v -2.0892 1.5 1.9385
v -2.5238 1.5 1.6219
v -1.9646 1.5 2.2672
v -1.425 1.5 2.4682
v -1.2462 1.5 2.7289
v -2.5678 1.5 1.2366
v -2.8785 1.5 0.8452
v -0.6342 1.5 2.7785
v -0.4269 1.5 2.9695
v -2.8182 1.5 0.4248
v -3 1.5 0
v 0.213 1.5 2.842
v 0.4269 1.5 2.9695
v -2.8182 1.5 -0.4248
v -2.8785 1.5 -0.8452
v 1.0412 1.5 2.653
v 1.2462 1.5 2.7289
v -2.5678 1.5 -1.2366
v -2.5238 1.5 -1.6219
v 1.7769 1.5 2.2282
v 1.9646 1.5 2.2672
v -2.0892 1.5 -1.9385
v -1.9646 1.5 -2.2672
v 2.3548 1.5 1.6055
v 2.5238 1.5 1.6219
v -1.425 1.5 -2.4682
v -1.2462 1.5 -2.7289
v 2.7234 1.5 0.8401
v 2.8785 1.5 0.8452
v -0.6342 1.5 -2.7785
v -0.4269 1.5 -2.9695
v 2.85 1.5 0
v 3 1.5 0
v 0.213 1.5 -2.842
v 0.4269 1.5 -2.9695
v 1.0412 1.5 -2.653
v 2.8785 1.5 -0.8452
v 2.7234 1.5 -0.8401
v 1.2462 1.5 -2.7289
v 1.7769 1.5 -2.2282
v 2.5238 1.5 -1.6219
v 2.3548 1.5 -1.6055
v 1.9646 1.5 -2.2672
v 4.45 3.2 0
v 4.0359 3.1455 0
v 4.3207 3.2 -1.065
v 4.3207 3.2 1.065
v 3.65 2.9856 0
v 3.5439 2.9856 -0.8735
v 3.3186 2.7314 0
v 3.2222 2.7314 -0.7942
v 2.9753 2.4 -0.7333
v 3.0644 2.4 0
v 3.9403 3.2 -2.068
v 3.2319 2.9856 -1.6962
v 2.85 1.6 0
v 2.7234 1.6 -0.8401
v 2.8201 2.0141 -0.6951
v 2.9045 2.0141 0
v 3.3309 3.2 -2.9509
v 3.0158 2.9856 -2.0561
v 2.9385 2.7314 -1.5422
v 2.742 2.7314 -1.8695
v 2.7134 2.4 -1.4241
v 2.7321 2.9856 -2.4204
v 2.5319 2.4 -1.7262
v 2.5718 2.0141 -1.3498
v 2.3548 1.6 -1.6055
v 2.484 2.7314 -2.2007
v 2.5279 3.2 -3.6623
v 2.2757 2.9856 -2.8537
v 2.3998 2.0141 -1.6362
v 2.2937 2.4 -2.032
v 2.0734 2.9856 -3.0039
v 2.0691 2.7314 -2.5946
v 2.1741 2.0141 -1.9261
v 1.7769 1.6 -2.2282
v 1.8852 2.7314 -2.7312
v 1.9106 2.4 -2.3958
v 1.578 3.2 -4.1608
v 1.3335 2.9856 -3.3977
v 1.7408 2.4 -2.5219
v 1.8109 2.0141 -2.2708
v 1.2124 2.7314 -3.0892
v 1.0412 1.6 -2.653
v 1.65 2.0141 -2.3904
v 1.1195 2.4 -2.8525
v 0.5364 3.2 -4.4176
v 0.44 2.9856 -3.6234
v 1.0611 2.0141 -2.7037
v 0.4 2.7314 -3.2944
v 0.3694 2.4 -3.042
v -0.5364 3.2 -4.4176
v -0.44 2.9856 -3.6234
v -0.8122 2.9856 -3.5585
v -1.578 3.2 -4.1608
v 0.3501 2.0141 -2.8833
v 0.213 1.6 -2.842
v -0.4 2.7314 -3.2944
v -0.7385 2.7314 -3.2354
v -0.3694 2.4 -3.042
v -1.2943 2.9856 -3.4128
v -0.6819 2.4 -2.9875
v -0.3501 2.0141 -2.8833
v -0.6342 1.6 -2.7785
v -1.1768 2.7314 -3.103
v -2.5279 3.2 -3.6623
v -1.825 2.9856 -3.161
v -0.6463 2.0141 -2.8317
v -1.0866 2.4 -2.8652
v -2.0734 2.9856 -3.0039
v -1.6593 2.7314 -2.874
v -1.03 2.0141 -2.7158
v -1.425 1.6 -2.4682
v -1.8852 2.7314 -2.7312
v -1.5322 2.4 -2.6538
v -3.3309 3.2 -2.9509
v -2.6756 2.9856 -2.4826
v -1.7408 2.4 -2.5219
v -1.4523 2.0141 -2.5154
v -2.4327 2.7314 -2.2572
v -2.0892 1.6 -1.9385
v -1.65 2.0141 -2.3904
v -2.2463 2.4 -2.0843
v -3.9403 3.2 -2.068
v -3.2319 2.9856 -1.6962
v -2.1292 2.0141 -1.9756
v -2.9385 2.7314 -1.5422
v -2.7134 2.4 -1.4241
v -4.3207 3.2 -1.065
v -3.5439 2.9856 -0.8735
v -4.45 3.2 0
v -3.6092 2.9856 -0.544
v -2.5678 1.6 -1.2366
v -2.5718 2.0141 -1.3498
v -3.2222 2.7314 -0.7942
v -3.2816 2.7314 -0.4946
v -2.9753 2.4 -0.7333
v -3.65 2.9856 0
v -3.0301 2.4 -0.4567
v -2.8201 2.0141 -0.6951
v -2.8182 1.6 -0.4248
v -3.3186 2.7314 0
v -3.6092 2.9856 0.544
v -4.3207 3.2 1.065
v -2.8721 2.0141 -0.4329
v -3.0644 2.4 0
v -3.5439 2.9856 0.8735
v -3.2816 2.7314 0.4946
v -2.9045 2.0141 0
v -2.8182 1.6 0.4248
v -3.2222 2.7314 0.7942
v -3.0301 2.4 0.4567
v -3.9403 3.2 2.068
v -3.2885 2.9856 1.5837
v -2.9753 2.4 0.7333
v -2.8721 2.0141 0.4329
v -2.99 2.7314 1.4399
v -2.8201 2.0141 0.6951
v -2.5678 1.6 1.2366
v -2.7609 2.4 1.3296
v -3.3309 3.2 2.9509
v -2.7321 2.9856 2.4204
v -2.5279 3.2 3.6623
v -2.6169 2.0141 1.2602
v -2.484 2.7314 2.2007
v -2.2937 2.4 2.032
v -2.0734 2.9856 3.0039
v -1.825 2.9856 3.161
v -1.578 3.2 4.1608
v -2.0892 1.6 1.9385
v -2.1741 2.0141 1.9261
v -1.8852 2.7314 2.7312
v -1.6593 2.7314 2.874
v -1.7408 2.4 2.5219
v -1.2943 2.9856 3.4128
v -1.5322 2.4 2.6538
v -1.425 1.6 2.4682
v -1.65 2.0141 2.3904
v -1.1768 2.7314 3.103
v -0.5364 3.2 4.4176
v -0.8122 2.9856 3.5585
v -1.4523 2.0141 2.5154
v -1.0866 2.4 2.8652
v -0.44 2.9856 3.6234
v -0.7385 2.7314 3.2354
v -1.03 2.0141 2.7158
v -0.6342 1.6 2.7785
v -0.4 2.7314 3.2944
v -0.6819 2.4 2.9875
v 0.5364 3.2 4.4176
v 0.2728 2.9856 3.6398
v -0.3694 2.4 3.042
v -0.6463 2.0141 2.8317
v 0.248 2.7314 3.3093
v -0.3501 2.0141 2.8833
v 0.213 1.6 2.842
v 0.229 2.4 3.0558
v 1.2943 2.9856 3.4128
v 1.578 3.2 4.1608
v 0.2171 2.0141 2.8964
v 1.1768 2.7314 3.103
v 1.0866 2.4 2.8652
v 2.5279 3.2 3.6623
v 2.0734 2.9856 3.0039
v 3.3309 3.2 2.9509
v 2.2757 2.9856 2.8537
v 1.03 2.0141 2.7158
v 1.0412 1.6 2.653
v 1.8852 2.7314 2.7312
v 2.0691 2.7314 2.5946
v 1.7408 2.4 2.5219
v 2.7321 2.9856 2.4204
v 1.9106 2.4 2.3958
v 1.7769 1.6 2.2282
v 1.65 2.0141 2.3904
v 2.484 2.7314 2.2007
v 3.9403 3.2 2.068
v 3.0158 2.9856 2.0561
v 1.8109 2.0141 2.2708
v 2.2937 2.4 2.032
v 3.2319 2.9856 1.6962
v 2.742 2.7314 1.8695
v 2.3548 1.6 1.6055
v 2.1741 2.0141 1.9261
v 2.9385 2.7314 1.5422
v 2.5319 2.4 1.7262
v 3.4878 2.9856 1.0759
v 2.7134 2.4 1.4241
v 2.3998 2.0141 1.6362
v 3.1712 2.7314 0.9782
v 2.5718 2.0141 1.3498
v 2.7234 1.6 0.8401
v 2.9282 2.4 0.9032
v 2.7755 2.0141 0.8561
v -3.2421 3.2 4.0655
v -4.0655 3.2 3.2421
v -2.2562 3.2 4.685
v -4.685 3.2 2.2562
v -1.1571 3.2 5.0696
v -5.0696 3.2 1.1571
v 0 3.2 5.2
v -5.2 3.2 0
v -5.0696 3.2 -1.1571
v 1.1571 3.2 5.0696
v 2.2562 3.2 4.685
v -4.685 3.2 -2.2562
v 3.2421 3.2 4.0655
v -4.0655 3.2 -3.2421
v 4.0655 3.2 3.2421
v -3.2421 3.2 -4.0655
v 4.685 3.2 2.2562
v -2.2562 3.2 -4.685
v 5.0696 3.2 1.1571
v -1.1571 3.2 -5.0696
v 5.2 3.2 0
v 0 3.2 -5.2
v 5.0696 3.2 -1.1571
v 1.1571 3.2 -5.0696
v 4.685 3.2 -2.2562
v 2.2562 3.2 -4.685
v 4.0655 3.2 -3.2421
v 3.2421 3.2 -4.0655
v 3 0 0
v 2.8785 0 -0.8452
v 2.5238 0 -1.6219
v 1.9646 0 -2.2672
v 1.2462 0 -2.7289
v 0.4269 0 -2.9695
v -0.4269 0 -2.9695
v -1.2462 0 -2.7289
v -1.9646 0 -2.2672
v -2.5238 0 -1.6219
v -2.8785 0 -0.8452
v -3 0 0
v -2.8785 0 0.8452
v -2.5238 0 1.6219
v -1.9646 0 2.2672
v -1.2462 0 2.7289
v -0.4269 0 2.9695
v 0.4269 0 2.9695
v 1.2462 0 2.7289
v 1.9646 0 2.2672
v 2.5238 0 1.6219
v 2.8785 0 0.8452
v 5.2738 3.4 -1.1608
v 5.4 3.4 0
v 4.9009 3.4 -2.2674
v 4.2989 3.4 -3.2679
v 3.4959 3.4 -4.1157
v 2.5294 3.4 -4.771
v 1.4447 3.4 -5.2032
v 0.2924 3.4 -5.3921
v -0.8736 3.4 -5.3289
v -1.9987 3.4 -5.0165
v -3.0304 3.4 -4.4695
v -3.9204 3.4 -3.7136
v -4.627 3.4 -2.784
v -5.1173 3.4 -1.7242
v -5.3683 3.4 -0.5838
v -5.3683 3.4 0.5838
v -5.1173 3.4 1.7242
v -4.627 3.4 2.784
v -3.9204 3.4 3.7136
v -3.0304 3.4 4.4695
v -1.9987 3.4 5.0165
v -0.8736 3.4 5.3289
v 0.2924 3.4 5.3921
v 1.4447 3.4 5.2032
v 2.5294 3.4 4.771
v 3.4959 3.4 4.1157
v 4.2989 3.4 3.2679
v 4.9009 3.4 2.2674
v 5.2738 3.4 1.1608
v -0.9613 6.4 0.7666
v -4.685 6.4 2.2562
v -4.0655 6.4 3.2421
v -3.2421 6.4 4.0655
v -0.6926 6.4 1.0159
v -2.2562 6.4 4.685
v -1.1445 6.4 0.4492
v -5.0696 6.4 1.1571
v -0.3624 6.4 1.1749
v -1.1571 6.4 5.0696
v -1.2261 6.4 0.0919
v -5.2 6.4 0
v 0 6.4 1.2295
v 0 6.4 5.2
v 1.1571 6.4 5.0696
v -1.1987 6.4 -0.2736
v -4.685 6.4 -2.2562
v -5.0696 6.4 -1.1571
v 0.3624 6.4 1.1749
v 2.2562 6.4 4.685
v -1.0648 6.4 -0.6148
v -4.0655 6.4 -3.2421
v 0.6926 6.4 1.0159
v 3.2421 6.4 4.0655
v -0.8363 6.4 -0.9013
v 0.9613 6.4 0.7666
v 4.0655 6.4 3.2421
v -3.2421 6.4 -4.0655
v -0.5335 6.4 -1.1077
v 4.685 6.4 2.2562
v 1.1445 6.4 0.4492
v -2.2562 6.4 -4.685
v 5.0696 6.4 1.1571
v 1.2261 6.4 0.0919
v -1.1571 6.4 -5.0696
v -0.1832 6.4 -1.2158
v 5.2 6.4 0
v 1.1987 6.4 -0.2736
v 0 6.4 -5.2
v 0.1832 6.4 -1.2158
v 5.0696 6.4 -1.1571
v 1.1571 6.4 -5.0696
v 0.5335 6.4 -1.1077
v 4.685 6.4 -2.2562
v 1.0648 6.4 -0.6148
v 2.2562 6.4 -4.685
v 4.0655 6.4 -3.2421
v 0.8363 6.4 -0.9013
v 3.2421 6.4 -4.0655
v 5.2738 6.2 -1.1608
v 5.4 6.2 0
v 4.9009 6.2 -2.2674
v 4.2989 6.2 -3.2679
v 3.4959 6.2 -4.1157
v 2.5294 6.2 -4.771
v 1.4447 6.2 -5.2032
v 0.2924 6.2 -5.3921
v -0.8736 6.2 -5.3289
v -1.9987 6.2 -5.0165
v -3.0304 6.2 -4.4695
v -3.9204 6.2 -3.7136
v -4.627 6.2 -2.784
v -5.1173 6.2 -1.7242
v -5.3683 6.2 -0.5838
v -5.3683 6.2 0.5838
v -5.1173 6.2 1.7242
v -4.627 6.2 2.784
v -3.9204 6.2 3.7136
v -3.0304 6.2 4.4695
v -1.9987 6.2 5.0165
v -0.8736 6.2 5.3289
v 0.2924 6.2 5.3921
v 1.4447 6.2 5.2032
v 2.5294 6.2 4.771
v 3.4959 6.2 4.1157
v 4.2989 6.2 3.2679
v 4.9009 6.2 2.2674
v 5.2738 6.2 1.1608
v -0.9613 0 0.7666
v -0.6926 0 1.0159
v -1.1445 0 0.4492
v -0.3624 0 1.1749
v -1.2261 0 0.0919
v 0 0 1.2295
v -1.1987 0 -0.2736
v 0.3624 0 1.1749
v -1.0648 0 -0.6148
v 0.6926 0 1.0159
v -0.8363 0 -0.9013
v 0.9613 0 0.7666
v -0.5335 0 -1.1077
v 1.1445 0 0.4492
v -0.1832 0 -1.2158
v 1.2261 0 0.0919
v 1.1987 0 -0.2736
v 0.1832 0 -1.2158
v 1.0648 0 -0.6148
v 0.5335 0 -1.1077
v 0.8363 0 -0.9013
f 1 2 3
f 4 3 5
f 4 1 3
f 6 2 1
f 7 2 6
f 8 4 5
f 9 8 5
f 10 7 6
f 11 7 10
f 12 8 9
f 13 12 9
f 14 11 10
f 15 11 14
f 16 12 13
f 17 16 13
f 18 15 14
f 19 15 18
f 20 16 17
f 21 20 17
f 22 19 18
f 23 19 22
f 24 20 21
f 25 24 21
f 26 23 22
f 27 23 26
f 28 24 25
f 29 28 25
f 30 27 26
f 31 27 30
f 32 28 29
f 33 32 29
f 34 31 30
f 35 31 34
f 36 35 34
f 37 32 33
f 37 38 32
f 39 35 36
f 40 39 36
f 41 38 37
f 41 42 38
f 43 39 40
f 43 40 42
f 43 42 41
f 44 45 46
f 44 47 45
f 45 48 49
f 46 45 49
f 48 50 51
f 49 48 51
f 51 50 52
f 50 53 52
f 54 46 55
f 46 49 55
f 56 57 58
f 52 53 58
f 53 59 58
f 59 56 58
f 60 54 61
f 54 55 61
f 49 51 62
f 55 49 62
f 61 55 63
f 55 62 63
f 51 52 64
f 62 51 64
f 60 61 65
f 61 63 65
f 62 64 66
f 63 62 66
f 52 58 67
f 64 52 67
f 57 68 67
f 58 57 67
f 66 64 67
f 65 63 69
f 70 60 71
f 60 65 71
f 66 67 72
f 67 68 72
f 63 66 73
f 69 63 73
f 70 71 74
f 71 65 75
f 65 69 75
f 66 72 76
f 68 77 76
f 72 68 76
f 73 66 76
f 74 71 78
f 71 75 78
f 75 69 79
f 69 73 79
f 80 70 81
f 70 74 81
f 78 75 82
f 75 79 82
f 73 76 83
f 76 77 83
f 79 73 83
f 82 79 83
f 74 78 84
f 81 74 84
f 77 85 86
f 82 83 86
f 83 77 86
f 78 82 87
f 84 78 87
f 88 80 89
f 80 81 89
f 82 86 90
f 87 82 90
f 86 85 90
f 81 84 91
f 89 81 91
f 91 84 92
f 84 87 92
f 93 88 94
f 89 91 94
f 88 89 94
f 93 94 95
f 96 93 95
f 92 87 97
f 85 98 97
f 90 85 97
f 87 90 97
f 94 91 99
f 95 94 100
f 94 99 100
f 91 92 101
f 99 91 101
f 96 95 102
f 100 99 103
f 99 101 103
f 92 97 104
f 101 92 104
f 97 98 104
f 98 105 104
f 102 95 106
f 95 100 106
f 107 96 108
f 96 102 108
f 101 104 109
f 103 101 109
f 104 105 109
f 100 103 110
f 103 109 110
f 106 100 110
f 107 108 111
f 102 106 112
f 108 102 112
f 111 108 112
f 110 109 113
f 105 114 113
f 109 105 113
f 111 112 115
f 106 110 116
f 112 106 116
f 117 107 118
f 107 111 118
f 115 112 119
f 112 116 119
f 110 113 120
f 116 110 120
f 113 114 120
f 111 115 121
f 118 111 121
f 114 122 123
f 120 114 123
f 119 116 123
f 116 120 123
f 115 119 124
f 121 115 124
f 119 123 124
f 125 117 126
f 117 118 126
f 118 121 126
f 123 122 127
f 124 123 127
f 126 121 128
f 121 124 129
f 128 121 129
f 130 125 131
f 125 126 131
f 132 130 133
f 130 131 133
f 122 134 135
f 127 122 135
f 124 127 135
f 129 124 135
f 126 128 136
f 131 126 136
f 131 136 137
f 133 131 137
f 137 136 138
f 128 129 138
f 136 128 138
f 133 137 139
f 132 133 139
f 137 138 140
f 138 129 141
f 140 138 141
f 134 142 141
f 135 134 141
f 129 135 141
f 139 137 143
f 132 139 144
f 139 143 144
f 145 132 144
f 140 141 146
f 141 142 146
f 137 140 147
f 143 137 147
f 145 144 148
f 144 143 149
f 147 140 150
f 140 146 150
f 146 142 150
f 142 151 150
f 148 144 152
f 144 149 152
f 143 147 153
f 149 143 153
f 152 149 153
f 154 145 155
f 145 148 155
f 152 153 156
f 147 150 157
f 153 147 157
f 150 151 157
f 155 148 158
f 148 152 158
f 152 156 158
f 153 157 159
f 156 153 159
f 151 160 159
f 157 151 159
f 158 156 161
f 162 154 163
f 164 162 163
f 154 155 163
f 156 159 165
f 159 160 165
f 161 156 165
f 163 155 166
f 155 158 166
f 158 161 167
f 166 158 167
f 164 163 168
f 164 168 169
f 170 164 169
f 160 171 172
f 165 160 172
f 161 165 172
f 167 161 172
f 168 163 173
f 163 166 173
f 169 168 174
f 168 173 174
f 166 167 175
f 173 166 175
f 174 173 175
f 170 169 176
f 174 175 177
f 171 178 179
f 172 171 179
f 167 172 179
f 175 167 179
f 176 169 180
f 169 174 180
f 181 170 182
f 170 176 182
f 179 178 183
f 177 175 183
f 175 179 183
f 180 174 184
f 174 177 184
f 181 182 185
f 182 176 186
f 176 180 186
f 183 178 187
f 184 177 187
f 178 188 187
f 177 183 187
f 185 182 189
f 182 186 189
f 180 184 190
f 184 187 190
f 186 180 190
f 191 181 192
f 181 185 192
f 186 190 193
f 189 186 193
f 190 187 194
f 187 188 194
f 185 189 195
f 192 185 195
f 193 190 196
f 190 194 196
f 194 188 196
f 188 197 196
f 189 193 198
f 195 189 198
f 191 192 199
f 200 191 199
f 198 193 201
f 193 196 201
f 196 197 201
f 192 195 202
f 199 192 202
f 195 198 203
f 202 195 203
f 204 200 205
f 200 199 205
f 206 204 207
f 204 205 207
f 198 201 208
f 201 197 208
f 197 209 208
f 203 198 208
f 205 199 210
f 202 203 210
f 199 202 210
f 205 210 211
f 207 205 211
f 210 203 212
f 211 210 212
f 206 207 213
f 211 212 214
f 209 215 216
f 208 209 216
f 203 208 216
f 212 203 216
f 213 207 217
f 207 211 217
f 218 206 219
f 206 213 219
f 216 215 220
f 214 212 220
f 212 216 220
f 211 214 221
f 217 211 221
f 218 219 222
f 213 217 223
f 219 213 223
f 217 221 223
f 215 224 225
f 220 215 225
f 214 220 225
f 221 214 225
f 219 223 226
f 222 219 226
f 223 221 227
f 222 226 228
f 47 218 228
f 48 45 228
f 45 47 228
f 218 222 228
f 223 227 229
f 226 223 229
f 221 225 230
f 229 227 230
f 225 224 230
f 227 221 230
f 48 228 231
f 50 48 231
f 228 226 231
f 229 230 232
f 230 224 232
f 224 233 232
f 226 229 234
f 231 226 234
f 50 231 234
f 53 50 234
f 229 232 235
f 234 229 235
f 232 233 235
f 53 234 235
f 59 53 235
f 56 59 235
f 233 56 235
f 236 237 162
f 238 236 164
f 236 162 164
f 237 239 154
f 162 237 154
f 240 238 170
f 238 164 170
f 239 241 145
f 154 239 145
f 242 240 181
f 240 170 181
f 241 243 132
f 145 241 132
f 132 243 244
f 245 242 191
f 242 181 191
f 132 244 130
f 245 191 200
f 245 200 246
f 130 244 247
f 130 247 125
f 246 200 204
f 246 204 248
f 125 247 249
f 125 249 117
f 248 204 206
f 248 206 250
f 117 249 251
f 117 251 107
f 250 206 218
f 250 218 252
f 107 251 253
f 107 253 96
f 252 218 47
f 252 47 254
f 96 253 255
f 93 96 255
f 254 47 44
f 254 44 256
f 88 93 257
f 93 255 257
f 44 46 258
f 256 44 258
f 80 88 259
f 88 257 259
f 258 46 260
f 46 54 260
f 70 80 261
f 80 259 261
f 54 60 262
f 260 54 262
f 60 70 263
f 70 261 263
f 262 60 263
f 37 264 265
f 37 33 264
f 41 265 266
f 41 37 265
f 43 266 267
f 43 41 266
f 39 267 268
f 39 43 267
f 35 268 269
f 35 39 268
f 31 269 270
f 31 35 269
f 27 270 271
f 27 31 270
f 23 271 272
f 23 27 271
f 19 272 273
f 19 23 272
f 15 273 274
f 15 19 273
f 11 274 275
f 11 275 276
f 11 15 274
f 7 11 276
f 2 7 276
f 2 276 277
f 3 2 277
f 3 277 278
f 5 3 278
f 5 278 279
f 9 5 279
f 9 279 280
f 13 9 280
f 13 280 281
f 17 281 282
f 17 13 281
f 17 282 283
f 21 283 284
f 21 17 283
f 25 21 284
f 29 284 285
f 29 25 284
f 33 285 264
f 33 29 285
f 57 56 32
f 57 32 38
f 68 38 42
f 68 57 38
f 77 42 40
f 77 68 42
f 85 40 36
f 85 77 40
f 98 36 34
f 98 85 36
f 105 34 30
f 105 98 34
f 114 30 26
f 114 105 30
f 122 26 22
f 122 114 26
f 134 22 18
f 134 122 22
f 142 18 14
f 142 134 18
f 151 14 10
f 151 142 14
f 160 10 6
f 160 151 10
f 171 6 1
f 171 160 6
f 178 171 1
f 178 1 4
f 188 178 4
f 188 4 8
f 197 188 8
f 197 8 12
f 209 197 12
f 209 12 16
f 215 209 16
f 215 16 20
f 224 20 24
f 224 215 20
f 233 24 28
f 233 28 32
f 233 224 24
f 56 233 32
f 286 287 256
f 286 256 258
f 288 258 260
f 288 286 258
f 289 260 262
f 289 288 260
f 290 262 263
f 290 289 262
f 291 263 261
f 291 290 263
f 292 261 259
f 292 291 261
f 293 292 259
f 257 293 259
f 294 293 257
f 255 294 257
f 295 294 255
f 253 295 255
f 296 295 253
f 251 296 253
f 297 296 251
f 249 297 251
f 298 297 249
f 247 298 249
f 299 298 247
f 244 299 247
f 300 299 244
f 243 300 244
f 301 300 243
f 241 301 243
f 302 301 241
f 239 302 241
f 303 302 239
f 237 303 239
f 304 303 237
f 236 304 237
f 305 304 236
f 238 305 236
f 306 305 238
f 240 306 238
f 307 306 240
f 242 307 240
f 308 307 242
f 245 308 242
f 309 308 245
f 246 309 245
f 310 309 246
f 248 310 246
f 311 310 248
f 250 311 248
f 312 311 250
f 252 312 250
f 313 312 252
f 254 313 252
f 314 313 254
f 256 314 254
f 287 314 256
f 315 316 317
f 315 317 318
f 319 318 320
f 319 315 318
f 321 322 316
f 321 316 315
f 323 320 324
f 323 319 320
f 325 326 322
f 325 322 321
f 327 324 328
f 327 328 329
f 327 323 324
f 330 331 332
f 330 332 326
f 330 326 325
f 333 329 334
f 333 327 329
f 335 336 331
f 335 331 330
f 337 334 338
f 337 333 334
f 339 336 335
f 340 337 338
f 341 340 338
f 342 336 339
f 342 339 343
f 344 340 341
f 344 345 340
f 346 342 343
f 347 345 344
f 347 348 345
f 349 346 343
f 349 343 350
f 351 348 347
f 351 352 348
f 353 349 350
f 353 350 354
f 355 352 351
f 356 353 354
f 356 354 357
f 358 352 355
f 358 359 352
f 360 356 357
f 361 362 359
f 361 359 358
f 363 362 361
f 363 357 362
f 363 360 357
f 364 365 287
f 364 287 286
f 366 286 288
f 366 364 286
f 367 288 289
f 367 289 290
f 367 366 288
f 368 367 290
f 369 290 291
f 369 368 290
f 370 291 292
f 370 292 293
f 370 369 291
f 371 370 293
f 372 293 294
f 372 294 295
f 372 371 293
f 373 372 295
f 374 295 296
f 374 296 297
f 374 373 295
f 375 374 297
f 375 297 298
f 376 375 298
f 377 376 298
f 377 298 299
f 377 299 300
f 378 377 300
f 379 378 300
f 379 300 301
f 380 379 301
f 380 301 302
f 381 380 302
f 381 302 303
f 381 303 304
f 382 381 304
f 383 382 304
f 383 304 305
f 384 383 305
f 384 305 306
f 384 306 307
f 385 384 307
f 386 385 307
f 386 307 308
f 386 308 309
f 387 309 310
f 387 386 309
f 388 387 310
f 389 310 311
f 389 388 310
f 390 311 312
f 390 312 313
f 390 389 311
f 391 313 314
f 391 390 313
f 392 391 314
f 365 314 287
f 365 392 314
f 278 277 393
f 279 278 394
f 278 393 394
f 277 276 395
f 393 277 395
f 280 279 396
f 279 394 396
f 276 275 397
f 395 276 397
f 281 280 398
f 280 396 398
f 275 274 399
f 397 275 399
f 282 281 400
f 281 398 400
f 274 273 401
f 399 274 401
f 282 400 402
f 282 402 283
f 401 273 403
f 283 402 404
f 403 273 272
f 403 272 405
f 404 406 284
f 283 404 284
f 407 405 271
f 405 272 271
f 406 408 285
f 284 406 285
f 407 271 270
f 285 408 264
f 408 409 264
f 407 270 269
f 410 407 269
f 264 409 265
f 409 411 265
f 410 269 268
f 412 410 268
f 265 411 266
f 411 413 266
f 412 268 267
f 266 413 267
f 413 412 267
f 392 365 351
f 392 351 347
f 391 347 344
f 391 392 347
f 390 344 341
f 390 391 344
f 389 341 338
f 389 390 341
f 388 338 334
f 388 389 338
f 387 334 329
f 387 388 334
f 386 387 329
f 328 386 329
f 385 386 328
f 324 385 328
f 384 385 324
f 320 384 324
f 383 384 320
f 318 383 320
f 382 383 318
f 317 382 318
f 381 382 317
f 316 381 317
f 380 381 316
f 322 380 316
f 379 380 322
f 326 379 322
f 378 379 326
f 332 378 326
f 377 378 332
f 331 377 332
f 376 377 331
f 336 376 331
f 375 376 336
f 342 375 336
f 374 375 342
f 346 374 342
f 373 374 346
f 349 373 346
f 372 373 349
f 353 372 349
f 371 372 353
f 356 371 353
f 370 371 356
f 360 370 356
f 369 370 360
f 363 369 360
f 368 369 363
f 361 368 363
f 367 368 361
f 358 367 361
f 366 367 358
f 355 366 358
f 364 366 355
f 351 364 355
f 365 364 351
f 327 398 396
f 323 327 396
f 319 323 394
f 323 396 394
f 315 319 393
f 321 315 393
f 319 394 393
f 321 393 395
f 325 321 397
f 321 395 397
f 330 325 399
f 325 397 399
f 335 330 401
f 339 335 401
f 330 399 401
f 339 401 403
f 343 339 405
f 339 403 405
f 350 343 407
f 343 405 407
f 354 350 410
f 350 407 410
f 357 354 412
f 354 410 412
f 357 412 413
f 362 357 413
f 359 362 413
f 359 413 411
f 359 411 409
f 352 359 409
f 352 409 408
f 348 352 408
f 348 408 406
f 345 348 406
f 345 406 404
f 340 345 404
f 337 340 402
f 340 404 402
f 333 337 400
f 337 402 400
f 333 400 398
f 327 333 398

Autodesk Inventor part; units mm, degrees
ref_plane "YZ Plane" through (0, 0, 0) normal (1, 0, 0) x (0, 1, 0)
ref_plane "XZ Plane" through (0, 0, 0) normal (0, 1, 0) x (-1, 0, 0)
ref_plane "XY Plane" through (0, 0, 0) normal (0, 0, 1) x (1, 0, 0)
sketch "Sketch1" plane through (0, 0, 0) normal (0, 0, 1) x (1, 0, 0)
  line L0 (0, 0) -> (0, 12.3467)
  line L1 (0, 0) -> (3, 0)
  line L2 (3, 0) -> (3, 1.5)
  line L3 (3, 1.5) -> (2.85, 1.5)
  line L4 (2.85, 1.5) -> (2.85, 3.2)
  line L5 (2.85, 3.2) -> (5.4, 3.2)
  line L6 (5.4, 3.2) -> (5.4, 6.4)
  line L7 (5.4, 6.4) -> (0, 6.4)
  line L8 (0, 0) -> (0, 6.4)
  dimension "d1" = 5.7
  dimension "d2" = 6
  dimension "d3" = 10.8
  dimension "d4" = 1.5
  dimension "d6" = 6.4
  dimension "d7" = 3.2
revolve "Revolution1" add sketch "Sketch1" angle 360 about axis through (0, 0, 0) along (0, 1, 0)
fillet "Fillet1" radius 1.6 1 edges at (-2.85, 3.2, 0)
chamfer "Chamfer1" distance 0.2 angle 45 2 edges at (-5.4, 6.4, 0) (-5.4, 3.2, 0)
hole "Hole1" at (0, 6.4, 0) direction (0, -1, 0) diameter 2.459 end through all thread size "M3x0.5" class "6H" standard "ISO Metric profile"
properties part number "Bed Thumb Screw" material "Stainless Steel"
